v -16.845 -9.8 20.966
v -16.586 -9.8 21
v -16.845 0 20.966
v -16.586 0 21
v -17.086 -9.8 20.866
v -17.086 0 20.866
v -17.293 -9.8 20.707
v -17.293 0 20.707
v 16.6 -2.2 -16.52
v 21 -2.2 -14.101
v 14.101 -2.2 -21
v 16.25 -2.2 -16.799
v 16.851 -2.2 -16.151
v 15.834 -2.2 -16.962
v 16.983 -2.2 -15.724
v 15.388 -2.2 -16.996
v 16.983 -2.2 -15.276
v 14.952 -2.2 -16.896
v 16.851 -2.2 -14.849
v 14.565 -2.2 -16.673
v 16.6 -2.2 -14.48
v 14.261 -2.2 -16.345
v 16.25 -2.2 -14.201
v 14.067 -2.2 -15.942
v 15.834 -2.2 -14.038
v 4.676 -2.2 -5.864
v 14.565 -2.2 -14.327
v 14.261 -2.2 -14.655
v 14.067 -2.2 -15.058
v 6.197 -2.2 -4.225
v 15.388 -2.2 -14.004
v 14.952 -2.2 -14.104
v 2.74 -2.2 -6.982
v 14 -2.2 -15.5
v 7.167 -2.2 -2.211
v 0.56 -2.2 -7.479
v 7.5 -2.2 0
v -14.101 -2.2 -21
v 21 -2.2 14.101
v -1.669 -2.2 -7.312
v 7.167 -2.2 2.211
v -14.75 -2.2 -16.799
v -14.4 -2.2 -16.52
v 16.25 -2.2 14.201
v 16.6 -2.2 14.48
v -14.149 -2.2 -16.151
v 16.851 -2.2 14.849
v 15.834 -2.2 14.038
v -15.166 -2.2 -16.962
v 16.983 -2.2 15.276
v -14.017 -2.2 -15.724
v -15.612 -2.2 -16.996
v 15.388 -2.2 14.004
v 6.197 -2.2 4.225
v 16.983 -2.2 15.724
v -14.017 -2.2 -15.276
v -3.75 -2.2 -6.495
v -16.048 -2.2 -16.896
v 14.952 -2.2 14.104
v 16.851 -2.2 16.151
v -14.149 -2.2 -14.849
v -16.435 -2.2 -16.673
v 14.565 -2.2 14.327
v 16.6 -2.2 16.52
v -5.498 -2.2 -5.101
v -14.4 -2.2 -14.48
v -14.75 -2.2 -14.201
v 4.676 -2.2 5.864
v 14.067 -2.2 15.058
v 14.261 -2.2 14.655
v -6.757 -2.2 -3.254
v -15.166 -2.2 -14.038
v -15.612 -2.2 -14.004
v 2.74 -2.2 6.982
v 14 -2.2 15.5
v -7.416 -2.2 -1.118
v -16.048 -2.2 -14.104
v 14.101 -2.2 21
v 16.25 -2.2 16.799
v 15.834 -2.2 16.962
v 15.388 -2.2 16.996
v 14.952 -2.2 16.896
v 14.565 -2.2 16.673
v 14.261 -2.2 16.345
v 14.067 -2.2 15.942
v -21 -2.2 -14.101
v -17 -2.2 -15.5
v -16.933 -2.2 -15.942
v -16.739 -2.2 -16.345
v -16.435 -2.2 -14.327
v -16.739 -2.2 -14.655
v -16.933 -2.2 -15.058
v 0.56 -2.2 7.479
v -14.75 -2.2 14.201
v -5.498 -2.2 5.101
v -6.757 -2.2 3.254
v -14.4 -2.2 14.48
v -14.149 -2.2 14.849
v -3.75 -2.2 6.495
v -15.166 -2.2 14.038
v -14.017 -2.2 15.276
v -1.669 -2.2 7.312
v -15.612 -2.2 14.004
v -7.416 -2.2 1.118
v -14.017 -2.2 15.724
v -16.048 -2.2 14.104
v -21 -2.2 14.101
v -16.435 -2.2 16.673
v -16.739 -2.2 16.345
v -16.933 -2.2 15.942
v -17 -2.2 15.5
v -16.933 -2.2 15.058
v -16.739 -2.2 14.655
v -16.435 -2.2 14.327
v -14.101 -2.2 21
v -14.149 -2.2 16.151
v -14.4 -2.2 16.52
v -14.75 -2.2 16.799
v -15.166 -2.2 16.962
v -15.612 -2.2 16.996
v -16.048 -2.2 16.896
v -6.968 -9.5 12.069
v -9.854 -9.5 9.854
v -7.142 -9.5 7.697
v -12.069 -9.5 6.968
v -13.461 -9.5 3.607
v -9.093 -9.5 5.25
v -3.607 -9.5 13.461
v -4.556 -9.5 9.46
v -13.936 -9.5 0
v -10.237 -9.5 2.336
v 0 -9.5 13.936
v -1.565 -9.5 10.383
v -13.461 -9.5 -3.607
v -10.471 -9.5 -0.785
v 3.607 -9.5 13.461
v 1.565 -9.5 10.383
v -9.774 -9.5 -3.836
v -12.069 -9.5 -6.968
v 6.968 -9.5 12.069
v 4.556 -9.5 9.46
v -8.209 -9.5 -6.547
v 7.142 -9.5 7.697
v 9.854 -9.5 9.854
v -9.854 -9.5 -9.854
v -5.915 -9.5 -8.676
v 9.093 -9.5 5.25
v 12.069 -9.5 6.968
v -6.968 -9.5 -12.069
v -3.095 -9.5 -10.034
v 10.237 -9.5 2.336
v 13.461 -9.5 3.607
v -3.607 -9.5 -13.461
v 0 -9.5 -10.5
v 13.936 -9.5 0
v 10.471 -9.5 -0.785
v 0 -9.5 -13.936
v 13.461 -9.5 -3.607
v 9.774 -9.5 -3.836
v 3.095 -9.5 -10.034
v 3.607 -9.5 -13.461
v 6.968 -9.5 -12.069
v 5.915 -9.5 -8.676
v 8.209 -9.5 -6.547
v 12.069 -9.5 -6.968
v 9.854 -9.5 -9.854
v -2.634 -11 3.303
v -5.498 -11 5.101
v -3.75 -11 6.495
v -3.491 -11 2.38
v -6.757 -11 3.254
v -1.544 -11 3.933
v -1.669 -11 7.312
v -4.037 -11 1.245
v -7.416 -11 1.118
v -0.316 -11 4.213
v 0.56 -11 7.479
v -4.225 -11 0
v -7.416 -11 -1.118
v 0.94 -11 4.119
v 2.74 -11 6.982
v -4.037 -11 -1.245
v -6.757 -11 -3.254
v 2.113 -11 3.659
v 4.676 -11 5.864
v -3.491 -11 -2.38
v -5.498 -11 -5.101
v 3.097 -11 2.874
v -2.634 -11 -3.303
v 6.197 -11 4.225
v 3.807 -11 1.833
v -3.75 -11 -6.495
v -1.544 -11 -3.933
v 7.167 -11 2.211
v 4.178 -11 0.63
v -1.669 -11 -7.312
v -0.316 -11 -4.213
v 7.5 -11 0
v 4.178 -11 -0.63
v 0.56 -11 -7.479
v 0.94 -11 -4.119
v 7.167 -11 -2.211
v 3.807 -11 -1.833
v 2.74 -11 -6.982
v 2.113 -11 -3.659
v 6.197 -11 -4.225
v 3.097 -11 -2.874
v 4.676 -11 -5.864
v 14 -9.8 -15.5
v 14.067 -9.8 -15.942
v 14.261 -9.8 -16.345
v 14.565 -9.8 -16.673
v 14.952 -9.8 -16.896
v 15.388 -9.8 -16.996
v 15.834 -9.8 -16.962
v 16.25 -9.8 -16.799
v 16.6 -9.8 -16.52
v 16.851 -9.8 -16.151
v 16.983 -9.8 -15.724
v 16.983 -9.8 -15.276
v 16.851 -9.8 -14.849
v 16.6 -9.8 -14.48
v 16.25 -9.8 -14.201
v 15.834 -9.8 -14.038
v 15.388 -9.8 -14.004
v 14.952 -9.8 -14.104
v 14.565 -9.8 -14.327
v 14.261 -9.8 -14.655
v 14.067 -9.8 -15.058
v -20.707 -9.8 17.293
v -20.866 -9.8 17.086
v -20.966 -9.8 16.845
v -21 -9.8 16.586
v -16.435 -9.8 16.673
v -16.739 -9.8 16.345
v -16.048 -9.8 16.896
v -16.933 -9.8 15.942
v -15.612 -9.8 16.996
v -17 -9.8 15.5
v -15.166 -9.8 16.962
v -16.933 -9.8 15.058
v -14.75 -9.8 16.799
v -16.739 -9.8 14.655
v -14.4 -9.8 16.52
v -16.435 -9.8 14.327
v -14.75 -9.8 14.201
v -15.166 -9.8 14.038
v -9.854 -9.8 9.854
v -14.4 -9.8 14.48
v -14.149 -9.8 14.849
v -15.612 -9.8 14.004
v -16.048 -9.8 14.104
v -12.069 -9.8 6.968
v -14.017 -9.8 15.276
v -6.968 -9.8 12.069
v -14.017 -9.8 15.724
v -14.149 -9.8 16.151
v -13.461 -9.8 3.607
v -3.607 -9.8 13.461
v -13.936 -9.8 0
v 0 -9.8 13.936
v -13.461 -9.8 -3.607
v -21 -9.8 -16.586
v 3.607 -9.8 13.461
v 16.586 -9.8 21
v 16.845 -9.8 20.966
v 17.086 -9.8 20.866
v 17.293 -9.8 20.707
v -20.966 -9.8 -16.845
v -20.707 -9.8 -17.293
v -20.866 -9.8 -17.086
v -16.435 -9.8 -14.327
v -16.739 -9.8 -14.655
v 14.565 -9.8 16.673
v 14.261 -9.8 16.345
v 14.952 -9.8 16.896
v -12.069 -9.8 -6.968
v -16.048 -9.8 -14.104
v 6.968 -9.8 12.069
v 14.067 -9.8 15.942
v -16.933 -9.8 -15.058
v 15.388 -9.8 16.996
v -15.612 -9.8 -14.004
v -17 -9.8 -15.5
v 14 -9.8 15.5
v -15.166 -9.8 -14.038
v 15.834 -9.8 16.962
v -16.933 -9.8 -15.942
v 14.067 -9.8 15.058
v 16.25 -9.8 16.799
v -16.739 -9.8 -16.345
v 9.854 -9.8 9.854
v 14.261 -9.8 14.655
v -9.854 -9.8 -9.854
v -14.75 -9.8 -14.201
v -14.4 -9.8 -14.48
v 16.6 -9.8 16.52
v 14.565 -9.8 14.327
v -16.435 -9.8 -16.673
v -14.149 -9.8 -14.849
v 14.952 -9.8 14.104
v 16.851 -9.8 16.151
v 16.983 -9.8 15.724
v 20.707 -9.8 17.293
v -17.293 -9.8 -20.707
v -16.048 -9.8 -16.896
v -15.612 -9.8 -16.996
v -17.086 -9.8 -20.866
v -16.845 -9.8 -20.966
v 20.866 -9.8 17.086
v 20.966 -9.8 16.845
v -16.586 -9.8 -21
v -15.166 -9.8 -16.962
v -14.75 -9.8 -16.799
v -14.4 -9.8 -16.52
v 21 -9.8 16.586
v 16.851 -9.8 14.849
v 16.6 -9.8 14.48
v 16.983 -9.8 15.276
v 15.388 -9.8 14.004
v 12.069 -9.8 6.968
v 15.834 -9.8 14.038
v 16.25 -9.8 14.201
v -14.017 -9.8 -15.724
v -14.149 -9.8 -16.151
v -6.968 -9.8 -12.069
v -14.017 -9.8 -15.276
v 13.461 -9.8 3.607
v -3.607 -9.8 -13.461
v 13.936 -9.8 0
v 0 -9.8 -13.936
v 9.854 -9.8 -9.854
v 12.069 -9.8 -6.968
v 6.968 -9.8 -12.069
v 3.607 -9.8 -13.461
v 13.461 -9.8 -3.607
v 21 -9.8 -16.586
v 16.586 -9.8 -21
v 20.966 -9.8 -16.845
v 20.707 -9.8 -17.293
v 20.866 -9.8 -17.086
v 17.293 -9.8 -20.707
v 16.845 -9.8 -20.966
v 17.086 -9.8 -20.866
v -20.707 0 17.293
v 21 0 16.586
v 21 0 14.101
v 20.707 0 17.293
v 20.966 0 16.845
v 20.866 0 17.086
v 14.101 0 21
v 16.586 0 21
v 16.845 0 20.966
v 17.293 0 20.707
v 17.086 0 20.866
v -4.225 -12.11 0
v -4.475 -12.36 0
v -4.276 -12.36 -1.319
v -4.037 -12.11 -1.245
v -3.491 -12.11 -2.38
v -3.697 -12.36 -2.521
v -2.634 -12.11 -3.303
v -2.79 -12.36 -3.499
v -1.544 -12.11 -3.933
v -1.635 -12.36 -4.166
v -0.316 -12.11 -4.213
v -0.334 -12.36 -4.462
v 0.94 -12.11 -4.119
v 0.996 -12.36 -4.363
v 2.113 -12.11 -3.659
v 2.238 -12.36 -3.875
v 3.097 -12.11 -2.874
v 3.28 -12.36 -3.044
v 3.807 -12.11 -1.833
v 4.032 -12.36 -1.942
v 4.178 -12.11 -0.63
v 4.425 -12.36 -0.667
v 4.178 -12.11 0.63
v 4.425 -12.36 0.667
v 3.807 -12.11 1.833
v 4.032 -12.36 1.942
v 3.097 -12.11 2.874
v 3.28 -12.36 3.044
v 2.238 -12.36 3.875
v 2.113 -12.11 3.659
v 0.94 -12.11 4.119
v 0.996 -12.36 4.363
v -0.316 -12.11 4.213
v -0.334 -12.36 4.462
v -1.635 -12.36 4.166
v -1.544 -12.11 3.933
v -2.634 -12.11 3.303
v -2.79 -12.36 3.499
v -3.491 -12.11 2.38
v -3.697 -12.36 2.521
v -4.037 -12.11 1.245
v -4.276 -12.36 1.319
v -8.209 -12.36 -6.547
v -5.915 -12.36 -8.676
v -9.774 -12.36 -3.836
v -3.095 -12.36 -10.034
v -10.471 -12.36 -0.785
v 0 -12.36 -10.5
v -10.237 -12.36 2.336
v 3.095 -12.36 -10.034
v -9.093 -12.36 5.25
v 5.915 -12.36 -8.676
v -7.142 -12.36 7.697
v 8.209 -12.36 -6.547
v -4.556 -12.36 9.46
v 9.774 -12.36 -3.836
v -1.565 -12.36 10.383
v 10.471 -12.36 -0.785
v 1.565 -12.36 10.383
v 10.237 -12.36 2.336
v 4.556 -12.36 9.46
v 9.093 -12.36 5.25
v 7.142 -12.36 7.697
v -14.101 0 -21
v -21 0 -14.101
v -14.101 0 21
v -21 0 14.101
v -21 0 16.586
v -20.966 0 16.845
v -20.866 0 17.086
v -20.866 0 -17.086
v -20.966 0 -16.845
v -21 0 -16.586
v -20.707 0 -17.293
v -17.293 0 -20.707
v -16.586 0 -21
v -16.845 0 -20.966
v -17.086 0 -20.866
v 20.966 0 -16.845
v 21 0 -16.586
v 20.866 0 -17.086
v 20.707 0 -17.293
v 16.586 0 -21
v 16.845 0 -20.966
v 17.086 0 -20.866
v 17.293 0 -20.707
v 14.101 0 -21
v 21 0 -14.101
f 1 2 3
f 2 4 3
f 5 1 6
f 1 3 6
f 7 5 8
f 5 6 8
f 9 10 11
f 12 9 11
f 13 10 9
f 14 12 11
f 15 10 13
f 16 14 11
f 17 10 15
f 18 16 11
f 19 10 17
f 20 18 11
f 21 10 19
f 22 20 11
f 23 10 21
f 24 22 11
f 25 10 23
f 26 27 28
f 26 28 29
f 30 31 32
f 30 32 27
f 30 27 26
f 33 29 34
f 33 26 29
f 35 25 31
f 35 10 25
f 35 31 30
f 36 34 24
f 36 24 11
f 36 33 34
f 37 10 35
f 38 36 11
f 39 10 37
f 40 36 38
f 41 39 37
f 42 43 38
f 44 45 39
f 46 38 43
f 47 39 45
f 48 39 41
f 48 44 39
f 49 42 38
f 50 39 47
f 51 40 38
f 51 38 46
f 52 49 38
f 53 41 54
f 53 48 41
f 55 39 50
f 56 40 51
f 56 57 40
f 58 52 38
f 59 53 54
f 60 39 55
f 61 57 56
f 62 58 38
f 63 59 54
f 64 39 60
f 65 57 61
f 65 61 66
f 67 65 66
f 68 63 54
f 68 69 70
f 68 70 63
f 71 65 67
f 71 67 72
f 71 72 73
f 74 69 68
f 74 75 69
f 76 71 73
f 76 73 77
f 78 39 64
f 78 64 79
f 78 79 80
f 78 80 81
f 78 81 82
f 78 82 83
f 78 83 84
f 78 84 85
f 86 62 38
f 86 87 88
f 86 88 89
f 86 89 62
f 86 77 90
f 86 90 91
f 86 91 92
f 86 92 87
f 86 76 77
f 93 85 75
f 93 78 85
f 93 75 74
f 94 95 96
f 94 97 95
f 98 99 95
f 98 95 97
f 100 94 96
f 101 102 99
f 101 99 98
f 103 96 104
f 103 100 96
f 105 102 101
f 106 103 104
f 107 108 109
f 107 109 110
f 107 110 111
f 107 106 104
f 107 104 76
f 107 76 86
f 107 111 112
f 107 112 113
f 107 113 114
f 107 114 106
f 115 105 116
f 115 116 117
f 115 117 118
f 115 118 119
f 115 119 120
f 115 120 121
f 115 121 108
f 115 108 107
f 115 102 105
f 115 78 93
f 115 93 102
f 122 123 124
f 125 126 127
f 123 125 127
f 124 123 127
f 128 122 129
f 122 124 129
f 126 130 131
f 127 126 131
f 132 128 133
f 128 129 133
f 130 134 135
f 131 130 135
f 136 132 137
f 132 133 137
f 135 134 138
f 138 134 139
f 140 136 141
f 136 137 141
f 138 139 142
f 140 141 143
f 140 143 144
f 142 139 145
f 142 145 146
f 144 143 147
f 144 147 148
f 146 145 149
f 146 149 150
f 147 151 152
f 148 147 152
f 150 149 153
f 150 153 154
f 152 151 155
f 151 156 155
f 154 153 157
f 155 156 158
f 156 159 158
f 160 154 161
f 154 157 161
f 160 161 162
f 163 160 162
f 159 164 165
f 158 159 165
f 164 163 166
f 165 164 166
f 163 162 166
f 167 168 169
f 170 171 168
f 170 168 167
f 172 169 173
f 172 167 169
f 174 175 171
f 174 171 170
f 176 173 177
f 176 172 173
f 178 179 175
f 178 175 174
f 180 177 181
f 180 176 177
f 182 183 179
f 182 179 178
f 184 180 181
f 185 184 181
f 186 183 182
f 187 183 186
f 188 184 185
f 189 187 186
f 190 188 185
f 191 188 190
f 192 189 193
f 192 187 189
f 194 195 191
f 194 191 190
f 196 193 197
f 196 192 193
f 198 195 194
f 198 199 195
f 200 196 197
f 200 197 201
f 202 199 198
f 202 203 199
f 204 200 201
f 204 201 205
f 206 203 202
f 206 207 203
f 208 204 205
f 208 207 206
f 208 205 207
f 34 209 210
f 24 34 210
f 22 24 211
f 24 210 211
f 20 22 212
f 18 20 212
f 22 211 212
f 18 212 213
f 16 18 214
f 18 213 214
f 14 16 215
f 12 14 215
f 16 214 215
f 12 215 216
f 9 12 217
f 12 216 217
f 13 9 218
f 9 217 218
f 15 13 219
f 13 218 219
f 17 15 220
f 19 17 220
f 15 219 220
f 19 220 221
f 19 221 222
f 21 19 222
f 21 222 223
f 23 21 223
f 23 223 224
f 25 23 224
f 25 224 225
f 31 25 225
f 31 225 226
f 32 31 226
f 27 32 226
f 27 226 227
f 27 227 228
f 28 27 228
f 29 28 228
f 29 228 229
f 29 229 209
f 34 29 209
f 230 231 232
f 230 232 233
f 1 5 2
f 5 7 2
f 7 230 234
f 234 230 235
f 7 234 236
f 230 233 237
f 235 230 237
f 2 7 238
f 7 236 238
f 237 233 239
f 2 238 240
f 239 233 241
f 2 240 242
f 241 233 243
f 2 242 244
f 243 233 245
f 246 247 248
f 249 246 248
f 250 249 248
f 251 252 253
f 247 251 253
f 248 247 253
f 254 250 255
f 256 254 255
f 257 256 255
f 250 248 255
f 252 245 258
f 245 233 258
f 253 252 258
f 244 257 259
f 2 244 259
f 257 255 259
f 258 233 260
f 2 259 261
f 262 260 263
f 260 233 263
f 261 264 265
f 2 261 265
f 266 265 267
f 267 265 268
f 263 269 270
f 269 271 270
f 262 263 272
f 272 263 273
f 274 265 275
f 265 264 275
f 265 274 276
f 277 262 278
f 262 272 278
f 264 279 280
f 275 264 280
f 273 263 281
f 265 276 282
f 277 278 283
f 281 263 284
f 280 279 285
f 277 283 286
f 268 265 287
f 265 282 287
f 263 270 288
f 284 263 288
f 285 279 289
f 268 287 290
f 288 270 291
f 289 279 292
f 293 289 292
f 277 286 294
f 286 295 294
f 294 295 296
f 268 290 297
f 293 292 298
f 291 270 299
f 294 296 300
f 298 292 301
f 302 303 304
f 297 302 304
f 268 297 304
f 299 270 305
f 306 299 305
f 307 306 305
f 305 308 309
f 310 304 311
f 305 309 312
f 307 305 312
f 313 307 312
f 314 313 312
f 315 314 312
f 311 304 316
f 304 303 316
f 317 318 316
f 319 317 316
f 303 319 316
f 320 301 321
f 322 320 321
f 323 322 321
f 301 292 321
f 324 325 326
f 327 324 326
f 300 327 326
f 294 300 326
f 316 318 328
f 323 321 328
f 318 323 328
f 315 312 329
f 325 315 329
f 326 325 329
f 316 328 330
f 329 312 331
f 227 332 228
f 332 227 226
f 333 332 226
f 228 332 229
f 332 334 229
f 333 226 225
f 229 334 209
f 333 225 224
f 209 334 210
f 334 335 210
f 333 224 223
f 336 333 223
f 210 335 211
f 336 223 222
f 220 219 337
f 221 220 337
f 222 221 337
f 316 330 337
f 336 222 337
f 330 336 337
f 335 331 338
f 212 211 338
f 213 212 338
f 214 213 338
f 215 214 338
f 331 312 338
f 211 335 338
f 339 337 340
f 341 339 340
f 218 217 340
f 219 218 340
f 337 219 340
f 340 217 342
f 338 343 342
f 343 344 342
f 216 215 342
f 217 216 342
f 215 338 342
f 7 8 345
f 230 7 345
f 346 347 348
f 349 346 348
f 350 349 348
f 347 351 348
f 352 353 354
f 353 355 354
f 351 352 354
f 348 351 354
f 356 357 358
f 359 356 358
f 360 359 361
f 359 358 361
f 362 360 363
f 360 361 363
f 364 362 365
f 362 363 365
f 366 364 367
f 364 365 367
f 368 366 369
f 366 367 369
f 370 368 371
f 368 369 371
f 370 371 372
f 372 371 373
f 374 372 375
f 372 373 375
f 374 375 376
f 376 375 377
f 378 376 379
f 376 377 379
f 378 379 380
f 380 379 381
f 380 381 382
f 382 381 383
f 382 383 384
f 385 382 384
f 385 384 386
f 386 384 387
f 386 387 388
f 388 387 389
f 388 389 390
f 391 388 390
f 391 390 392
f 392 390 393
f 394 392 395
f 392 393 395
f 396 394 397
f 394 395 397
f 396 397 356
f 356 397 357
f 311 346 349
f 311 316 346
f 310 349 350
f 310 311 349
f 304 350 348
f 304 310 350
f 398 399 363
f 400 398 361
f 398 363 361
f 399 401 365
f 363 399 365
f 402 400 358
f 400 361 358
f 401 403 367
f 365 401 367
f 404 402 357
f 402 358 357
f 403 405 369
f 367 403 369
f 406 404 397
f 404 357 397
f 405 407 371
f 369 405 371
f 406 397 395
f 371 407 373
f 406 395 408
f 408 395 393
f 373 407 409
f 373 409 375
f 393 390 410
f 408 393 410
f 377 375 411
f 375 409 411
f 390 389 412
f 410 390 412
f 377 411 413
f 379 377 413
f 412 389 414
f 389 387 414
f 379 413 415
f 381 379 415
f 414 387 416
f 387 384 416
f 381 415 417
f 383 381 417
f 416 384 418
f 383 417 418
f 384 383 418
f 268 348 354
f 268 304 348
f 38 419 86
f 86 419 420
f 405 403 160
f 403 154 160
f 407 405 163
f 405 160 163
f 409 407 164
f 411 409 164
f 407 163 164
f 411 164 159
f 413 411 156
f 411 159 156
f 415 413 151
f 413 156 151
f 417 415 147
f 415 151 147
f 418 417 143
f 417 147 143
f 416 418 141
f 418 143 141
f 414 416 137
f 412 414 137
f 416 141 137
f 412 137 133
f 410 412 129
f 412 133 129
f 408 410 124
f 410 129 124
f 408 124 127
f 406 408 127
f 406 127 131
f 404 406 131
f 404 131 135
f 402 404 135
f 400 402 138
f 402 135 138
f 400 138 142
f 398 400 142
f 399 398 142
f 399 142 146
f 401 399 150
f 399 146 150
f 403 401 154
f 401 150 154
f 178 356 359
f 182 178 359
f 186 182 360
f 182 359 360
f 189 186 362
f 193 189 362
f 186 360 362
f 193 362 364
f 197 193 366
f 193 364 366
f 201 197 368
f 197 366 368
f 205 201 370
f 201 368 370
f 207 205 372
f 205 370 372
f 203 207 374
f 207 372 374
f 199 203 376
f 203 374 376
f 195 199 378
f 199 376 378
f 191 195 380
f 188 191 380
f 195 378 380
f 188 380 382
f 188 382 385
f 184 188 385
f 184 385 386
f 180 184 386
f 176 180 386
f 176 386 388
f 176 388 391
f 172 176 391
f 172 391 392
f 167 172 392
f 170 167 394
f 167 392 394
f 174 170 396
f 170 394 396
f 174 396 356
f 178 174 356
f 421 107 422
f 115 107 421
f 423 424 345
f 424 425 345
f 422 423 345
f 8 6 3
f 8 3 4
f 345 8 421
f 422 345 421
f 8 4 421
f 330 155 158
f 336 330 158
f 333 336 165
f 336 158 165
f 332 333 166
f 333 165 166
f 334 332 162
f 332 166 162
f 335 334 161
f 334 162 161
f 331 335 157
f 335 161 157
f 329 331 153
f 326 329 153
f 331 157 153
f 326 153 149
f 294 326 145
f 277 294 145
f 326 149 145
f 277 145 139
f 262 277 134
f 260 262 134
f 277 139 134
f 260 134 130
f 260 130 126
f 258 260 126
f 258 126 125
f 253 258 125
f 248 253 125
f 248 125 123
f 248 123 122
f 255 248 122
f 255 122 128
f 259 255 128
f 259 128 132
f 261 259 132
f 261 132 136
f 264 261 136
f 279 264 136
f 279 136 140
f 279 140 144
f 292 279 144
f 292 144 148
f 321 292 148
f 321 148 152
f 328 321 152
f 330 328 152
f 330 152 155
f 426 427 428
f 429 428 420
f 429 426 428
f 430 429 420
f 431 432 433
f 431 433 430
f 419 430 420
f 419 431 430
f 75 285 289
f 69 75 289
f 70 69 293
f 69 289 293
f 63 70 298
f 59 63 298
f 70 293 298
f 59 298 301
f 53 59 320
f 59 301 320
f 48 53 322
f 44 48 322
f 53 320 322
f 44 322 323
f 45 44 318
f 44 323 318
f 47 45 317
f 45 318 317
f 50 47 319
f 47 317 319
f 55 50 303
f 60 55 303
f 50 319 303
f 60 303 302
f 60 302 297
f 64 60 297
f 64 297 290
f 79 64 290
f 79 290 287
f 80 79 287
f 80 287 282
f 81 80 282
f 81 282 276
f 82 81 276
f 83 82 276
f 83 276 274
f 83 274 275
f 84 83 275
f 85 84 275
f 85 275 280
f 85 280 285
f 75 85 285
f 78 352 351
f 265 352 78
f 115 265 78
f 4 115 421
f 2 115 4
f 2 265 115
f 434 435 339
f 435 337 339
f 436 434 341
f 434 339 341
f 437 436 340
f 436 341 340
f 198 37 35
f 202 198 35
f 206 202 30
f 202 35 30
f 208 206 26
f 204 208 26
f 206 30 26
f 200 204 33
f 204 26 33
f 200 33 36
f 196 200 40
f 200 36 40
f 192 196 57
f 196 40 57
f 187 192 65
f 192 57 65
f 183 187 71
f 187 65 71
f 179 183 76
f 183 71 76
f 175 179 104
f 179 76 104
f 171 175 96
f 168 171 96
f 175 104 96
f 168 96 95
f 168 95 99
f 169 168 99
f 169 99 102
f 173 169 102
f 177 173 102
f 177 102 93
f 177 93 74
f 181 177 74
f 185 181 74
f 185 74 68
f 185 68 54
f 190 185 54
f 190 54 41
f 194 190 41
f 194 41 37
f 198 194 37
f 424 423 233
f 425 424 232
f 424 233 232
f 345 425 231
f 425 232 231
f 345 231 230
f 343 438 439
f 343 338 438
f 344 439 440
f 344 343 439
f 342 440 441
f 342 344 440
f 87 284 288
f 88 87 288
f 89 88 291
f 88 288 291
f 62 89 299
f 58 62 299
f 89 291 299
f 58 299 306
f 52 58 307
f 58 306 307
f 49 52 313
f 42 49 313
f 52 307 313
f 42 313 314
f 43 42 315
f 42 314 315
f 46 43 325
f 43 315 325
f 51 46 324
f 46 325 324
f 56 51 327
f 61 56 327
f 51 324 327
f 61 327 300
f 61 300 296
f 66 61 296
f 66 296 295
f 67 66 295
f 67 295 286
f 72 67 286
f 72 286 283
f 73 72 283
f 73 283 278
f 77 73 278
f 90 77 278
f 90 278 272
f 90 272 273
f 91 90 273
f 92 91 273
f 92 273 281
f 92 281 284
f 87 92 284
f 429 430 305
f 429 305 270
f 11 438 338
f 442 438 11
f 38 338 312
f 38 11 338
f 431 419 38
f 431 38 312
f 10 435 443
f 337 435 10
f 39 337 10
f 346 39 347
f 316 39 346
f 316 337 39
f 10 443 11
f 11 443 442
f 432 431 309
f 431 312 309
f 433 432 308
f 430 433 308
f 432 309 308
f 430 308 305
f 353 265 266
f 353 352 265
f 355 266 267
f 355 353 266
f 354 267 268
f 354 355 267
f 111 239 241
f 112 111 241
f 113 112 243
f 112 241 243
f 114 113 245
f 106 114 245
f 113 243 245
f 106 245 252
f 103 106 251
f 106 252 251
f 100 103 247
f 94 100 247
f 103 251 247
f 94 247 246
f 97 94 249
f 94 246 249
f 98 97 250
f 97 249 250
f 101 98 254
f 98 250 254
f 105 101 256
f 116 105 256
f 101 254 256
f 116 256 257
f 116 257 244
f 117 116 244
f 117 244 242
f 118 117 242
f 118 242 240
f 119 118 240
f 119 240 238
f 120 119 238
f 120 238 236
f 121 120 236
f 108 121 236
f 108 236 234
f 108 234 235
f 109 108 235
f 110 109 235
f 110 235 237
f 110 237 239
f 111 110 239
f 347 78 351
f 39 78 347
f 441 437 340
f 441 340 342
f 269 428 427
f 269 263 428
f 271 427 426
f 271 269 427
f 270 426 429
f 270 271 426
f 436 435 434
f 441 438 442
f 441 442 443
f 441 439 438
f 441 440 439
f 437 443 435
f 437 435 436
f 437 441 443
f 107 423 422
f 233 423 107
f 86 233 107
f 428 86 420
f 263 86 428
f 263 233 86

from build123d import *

# Parameters (mm, degrees)
SALIENTE_EXTRUIR1_DEPTH                              = 9.8
CORTAR_EXTRUIR1_DEPTH                                = 2.2
SALIENTE_EXTRUIR2_DEPTH                              = 2.2
SALIENTE_EXTRUIR3_DEPTH                              = 2.2
TALADRO_DE_MARGEN_PARA_M241_D                        = 27.8721
TALADRO_DE_MARGEN_PARA_M241_DEPTH                    = 0.3
CROQUIS7_W                                           = 10.5
CROQUIS7_H                                           = 2.86
REFRENTADO_PARA_PERNO_CON_CABEZA_HEXAGON_D           = 8.45
REFRENTADO_PARA_PERNO_CON_CABEZA_HEXAGON_CBORE_D     = 15
REFRENTADO_PARA_PERNO_CON_CABEZA_HEXAGON_CBORE_DEPTH = 8.8
DI_METRO_DE_TALADRO_3_0_3_1_D                        = 3
DI_METRO_DE_TALADRO_3_0_3_1_DEPTH                    = 10.16
CHAFL_N1_SIZE                                        = 0.25
REDONDEO1_R                                          = 1


with BuildPart() as part:
    # Croquis1 → Saliente-Extruir1 (new body)
    with BuildSketch(Plane(origin=(0, 0, 0), x_dir=(1, 0, 0), z_dir=(0, 1, 0))):
        Polygon((-21, 17), (-21, -17), (-17, -21), (17, -21), (21, -17), (21, 17), (17, 21), (-17, 21), align=None)
    extrude(amount=-SALIENTE_EXTRUIR1_DEPTH)

    # Croquis2 → Cortar-Extruir1 (cut)
    with BuildSketch(Plane(origin=(0, 0, 0), x_dir=(-1, 0, 0), z_dir=(0, 1, 0))):
        Polygon((-14.100780618, -21), (14.100780618, -21), (21, -14.100780618), (21, 17), (17, 21), (-17, 21), (-21, 17), (-21, -14.100780618), align=None)
    extrude(amount=-CORTAR_EXTRUIR1_DEPTH, mode=Mode.SUBTRACT)

    # Croquis3 → Saliente-Extruir2 (add)
    with BuildSketch(Plane(origin=(0, -2.2, 0), x_dir=(-1, 0, 0), z_dir=(0, 1, 0))):
        Polygon((-14.100780618, 21), (-21, 14.100780618), (-21, 17), (-17, 21), align=None)
    extrude(amount=SALIENTE_EXTRUIR2_DEPTH)

    # Croquis4 → Saliente-Extruir3 (add)
    with BuildSketch(Plane(origin=(0, -2.2, 0), x_dir=(-1, 0, 0), z_dir=(0, 1, 0))):
        Polygon((17, 21), (21, 17), (21, 14.100780618), (14.100780618, 21), align=None)
    extrude(amount=SALIENTE_EXTRUIR3_DEPTH)

    # Taladro de margen para M241
    with Locations(Plane(origin=(0, -9.8, 0), x_dir=(-1, 0, 0), z_dir=(0, -1, 0))):
        with Locations((0, 0)):
            Hole(TALADRO_DE_MARGEN_PARA_M241_D / 2, depth=TALADRO_DE_MARGEN_PARA_M241_DEPTH)

    # Croquis7 → Revolución1 (revolve)
    with BuildSketch(Plane.XY, mode=Mode.PRIVATE) as revoluci_n1_sk:
        with Locations((5.25, -10.93)):
            Rectangle(CROQUIS7_W, CROQUIS7_H)
    revolve(revoluci_n1_sk.sketch.rotate(Axis((0, -9.5, 0), (0, -1, 0)), 270), axis=Axis((0, -9.5, 0), (0, -1, 0)))

    # Refrentado para perno con cabeza hexagonal de M81 (through all)
    with Locations(Plane(origin=(0, -2.2, 0), x_dir=(1, 0, 0), z_dir=(0, 1, 0))):
        with Locations((0, 0)):
            CounterBoreHole(REFRENTADO_PARA_PERNO_CON_CABEZA_HEXAGON_D / 2, REFRENTADO_PARA_PERNO_CON_CABEZA_HEXAGON_CBORE_D / 2, REFRENTADO_PARA_PERNO_CON_CABEZA_HEXAGON_CBORE_DEPTH)

    # Diámetro de taladro Ø3.0 (3)1
    with Locations(Plane(origin=(0, -2.2, 0), x_dir=(1, 0, 0), z_dir=(0, 1, 0))):
        with Locations((15.5, -15.5), (15.5, 15.5), (-15.5, -15.5), (-15.5, 15.5)):
            Hole(DI_METRO_DE_TALADRO_3_0_3_1_D / 2, depth=DI_METRO_DE_TALADRO_3_0_3_1_DEPTH)

    # Chaflán1
    chafl_n1_edges = [part.edges().sort_by_distance(p)[0] for p in [
        (4.225, -12.36, 0),
    ]]
    chamfer(chafl_n1_edges, length=CHAFL_N1_SIZE)

    # Redondeo1
    redondeo1_edges = [part.edges().sort_by_distance(p)[0] for p in [
        (-17, -4.9, -21),
        (17, -4.9, -21),
        (21, -4.9, -17),
        (21, -4.9, 17),
        (17, -4.9, 21),
        (-17, -4.9, 21),
        (-21, -4.9, 17),
        (-21, -4.9, -17),
    ]]
    fillet(redondeo1_edges, radius=REDONDEO1_R)


solid = part.part
